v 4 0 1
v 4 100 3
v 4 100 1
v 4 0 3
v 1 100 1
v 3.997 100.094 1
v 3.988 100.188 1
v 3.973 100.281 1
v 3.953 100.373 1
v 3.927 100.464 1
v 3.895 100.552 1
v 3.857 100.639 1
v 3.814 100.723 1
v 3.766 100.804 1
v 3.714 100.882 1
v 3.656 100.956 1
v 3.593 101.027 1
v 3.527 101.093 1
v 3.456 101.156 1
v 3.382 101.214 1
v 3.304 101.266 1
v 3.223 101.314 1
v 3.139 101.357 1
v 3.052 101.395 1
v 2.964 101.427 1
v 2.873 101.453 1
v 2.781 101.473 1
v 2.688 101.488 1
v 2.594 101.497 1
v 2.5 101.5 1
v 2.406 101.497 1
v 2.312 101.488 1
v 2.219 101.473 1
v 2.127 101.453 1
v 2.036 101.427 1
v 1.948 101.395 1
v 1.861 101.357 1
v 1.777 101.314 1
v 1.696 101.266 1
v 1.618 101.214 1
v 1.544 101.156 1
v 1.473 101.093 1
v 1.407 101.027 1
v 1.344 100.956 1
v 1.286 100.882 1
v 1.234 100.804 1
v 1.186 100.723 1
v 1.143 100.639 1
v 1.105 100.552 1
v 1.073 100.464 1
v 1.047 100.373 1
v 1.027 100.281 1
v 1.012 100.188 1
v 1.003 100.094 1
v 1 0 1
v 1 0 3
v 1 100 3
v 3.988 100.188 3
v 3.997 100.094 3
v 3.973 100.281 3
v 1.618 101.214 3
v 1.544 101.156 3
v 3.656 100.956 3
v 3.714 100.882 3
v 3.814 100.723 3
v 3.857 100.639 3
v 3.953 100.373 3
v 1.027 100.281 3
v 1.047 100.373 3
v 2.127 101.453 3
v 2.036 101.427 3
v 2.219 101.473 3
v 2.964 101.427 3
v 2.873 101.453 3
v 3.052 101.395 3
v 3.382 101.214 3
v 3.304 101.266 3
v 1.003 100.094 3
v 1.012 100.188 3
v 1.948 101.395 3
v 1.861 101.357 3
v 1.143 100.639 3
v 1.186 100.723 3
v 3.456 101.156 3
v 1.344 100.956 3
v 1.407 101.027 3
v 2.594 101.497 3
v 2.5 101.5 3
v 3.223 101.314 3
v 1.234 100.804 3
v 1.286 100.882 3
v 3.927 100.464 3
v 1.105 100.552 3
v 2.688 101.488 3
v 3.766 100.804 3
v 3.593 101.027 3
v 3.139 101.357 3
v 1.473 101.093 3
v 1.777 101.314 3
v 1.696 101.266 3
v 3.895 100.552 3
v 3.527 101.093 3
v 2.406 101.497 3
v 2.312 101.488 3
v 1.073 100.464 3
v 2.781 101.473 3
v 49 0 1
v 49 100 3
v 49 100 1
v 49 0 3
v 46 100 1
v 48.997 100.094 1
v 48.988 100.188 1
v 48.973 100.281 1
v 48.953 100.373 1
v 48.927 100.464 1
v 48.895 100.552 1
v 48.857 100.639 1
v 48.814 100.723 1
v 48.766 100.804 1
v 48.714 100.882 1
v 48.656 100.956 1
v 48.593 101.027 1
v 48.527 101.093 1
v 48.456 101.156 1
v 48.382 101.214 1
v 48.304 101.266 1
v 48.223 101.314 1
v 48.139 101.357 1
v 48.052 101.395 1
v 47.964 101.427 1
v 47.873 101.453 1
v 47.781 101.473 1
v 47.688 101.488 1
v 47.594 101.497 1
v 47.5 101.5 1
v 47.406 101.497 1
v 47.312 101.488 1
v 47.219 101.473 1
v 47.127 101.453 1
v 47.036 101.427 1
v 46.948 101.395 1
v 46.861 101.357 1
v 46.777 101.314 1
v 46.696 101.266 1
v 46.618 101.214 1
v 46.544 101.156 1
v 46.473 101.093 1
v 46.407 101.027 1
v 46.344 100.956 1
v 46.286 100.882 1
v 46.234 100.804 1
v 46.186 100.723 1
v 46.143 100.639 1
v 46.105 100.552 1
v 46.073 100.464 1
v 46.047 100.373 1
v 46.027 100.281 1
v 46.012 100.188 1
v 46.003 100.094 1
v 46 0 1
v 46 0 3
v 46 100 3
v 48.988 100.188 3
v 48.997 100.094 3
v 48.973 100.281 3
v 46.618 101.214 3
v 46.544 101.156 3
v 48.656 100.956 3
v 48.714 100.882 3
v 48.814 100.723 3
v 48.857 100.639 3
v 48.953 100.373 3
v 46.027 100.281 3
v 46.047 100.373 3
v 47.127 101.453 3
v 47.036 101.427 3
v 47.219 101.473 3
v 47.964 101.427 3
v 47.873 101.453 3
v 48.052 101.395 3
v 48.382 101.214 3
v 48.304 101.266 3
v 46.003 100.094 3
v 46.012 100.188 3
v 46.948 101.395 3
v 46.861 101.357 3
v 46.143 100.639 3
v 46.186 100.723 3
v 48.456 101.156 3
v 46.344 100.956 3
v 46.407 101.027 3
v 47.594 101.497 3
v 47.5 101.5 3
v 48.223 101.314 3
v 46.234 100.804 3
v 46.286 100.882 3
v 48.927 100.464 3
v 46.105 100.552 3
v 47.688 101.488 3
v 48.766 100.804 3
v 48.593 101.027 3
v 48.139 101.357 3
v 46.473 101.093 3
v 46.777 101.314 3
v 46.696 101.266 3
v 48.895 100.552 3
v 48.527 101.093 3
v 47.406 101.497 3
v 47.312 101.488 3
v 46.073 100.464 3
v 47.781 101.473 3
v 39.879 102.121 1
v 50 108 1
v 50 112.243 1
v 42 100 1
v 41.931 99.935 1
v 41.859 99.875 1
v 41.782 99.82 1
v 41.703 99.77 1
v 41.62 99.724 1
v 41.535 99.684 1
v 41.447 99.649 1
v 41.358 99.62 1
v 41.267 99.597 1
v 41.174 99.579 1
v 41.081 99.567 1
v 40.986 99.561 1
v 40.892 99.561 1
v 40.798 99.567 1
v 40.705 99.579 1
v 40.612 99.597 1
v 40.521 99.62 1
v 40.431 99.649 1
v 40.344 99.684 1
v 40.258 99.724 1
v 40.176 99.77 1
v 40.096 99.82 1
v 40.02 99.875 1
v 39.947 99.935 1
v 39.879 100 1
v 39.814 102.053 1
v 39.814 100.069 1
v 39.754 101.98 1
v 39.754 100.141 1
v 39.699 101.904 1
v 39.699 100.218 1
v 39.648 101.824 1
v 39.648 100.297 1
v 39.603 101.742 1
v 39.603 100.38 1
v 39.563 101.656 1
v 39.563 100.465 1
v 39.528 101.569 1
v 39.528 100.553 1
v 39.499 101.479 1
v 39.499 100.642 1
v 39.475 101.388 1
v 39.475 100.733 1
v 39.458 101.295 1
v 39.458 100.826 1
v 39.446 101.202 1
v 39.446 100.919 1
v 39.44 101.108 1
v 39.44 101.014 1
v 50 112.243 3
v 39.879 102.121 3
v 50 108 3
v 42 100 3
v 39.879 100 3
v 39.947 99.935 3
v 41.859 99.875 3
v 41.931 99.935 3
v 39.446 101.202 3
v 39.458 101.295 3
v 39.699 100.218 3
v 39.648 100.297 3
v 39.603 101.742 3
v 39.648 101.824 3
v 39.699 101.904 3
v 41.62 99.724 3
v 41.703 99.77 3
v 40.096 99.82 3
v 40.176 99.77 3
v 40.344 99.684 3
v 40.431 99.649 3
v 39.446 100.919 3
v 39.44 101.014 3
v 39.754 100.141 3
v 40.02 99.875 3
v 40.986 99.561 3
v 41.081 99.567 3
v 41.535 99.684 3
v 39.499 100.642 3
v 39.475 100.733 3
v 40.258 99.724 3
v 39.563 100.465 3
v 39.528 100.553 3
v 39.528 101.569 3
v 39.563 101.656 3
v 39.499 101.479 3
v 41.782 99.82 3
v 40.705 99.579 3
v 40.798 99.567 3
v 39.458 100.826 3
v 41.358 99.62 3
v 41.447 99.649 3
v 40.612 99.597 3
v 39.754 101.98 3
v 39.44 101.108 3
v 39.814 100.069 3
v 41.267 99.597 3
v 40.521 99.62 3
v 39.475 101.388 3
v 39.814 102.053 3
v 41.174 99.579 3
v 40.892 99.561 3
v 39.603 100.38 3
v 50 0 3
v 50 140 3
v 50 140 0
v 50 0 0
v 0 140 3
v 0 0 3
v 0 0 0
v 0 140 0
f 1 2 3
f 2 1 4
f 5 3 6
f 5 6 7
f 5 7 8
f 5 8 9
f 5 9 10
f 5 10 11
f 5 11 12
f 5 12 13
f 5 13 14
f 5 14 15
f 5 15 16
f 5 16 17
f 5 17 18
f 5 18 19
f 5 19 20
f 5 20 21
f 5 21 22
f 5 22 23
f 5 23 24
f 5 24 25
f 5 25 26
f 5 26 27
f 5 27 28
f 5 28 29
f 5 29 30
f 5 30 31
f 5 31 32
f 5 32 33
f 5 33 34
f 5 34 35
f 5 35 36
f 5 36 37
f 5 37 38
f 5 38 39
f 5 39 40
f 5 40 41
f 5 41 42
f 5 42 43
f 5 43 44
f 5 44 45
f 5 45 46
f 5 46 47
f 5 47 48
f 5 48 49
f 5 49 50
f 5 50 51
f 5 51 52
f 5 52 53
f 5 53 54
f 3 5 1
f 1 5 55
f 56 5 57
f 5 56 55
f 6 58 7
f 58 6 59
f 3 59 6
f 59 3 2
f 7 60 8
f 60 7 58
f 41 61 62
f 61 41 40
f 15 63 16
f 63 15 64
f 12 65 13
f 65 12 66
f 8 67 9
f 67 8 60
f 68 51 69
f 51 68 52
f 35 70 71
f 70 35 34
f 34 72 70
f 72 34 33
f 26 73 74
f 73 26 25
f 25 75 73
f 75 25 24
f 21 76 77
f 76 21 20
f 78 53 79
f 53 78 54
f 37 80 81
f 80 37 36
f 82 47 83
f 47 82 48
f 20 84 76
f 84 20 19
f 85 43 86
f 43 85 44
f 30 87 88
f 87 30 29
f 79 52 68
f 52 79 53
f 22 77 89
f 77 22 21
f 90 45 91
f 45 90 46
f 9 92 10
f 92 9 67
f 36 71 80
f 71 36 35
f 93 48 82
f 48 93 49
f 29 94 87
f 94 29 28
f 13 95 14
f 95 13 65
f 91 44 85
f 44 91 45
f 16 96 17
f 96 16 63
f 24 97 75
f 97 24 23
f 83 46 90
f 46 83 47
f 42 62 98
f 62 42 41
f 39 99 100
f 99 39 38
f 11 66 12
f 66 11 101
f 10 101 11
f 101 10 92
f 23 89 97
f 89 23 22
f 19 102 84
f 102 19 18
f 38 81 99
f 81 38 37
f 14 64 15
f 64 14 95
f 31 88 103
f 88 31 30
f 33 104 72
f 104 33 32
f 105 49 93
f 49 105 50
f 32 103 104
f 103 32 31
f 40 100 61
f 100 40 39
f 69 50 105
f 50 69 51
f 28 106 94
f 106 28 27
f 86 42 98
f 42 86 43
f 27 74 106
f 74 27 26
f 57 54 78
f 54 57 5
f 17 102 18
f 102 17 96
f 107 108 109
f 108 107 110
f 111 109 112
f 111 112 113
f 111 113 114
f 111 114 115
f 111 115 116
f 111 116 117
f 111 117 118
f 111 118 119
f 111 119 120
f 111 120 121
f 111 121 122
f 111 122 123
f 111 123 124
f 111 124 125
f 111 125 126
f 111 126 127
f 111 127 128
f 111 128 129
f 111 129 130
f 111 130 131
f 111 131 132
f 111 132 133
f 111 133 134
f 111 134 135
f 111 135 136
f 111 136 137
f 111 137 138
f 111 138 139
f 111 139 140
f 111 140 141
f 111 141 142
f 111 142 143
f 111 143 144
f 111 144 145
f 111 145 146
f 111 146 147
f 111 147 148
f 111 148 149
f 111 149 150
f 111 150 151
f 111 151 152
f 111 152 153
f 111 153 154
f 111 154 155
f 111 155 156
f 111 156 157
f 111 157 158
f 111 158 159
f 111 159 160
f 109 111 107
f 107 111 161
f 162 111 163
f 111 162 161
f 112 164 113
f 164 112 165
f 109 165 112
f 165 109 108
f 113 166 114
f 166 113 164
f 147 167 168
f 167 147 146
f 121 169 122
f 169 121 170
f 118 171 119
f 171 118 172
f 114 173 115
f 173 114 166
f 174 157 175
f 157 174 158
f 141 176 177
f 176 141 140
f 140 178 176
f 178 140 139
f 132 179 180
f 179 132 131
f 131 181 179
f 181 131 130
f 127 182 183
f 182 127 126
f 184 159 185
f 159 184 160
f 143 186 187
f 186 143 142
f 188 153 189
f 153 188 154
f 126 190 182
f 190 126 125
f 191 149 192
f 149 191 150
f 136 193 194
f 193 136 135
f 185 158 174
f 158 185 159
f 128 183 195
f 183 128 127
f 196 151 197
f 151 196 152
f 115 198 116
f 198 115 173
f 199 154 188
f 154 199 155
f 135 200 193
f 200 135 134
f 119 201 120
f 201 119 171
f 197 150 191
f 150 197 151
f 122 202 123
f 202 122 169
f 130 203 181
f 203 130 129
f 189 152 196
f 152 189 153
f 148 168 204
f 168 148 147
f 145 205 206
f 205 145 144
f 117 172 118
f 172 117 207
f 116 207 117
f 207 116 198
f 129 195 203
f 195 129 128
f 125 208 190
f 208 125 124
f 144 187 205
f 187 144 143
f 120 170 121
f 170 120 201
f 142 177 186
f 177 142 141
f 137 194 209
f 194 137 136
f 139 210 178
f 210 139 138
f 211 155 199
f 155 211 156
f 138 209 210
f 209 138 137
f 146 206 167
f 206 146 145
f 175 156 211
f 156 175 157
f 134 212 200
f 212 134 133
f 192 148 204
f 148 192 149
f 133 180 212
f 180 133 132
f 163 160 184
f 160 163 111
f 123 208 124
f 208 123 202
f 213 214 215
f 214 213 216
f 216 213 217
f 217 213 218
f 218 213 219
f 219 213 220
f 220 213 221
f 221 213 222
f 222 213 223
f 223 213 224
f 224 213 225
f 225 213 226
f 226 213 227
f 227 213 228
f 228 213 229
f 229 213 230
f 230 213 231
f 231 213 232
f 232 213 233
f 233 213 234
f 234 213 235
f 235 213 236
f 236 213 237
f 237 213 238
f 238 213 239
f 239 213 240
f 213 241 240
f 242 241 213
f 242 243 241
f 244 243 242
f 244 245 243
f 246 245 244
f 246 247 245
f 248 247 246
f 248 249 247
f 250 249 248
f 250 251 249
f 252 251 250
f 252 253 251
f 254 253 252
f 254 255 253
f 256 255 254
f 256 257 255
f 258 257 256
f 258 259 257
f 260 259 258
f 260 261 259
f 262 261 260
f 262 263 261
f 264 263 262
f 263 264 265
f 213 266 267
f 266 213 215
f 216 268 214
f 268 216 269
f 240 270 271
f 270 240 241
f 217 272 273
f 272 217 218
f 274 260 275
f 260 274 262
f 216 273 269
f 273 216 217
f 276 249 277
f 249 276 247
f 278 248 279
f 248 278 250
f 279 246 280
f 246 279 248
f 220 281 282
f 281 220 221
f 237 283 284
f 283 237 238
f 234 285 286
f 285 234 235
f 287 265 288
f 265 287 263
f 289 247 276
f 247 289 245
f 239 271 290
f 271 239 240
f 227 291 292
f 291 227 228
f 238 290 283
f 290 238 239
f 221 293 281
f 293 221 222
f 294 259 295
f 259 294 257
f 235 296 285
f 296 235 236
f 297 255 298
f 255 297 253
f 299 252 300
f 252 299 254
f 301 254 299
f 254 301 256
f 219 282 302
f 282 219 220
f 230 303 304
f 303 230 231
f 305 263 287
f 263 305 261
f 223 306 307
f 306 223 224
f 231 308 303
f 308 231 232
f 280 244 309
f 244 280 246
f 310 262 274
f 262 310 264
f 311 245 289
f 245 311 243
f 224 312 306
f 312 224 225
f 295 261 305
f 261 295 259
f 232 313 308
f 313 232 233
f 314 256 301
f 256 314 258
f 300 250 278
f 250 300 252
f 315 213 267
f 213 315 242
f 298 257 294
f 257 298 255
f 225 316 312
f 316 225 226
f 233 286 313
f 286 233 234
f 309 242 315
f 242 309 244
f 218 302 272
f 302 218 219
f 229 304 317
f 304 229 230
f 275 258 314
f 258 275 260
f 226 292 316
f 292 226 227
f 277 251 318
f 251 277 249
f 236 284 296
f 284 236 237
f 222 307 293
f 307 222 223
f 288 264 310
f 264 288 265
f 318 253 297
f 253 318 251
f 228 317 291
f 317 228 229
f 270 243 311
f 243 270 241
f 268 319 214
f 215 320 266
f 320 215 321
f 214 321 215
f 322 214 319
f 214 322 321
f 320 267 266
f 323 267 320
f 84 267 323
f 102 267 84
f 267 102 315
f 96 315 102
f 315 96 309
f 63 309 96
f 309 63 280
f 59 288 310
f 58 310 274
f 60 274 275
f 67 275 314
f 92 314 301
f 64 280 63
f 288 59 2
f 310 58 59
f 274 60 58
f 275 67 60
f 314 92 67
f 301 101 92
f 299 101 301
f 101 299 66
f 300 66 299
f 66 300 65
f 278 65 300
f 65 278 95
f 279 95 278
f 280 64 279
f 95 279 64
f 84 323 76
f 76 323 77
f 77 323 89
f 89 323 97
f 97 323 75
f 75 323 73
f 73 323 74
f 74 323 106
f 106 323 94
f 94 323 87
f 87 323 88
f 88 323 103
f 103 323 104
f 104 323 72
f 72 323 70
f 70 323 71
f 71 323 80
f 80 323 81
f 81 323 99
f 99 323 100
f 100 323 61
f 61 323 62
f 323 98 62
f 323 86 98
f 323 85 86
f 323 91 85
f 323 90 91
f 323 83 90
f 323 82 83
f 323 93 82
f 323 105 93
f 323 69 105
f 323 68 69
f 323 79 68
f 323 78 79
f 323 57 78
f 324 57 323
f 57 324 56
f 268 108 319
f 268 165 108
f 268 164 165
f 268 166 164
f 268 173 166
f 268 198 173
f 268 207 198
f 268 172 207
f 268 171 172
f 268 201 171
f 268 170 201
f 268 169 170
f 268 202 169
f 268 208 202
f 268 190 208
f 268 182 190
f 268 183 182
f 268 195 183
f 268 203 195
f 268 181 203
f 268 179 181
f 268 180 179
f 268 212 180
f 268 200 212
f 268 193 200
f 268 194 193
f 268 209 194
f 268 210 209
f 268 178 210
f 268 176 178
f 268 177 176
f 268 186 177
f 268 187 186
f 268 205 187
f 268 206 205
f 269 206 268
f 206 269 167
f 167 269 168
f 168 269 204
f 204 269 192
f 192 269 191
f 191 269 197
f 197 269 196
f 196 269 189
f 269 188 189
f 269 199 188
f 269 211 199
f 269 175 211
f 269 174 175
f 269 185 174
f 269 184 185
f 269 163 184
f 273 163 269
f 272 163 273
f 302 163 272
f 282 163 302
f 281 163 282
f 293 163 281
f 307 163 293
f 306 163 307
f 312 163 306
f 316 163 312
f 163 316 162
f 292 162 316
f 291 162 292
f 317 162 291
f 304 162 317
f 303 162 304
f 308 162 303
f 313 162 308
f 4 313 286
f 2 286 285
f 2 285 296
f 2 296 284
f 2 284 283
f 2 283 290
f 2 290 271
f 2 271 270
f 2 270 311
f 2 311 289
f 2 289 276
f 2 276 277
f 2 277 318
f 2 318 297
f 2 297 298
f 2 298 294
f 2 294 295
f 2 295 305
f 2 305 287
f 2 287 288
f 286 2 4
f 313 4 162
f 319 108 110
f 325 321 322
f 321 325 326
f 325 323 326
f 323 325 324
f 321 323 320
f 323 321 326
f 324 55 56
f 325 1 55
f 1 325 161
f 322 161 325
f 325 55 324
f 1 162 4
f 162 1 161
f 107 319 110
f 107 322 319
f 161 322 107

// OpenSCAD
// file: constants.scad
//panel dimensions
pwidth = 60;
pheight = 100;

//side dimensions
swidth = 50;
sheight = pheight + 40;
sidepannel_margin = 1;

thickness1 = 2;
thickness2 = 3;
grovedepth = 2;

mfold = 5;

$fn = 100;
// main file
include <constants.scad>

margin = 1;

//Groves for the front and back pannels
module pgrove(displacement){
    union(){
	translate([displacement,-mfold ,thickness2-thickness1]) 
	    cube([thickness2, pheight+mfold, thickness1+mfold]);
	translate([displacement + thickness2/2, pheight ,thickness2-thickness1]) 
	    cylinder(h=thickness1+mfold, d=thickness2);
    }
}

module pgroves(){
    union(){
	pgrove(margin);
	pgrove(swidth-margin-thickness2);
    }
}

module lamella(xpos, ypos, angle, length, width, ele){
    translate([xpos,ypos,ele]){
	rotate([0,0,45])
	    union(){
	    cube([length, width, thickness2+mfold]);
	    translate([0, width/2,0]) cylinder(h=thickness2 + mfold, d=width);
	}
    }
}

module lamellas(startx, ypos, angle){
    lamella(pwidth-18,pheight,45,20,3,thickness2-thickness1);
}

difference(){
    cube([swidth, sheight, thickness2]);
    pgroves();
    lamellas();
}
